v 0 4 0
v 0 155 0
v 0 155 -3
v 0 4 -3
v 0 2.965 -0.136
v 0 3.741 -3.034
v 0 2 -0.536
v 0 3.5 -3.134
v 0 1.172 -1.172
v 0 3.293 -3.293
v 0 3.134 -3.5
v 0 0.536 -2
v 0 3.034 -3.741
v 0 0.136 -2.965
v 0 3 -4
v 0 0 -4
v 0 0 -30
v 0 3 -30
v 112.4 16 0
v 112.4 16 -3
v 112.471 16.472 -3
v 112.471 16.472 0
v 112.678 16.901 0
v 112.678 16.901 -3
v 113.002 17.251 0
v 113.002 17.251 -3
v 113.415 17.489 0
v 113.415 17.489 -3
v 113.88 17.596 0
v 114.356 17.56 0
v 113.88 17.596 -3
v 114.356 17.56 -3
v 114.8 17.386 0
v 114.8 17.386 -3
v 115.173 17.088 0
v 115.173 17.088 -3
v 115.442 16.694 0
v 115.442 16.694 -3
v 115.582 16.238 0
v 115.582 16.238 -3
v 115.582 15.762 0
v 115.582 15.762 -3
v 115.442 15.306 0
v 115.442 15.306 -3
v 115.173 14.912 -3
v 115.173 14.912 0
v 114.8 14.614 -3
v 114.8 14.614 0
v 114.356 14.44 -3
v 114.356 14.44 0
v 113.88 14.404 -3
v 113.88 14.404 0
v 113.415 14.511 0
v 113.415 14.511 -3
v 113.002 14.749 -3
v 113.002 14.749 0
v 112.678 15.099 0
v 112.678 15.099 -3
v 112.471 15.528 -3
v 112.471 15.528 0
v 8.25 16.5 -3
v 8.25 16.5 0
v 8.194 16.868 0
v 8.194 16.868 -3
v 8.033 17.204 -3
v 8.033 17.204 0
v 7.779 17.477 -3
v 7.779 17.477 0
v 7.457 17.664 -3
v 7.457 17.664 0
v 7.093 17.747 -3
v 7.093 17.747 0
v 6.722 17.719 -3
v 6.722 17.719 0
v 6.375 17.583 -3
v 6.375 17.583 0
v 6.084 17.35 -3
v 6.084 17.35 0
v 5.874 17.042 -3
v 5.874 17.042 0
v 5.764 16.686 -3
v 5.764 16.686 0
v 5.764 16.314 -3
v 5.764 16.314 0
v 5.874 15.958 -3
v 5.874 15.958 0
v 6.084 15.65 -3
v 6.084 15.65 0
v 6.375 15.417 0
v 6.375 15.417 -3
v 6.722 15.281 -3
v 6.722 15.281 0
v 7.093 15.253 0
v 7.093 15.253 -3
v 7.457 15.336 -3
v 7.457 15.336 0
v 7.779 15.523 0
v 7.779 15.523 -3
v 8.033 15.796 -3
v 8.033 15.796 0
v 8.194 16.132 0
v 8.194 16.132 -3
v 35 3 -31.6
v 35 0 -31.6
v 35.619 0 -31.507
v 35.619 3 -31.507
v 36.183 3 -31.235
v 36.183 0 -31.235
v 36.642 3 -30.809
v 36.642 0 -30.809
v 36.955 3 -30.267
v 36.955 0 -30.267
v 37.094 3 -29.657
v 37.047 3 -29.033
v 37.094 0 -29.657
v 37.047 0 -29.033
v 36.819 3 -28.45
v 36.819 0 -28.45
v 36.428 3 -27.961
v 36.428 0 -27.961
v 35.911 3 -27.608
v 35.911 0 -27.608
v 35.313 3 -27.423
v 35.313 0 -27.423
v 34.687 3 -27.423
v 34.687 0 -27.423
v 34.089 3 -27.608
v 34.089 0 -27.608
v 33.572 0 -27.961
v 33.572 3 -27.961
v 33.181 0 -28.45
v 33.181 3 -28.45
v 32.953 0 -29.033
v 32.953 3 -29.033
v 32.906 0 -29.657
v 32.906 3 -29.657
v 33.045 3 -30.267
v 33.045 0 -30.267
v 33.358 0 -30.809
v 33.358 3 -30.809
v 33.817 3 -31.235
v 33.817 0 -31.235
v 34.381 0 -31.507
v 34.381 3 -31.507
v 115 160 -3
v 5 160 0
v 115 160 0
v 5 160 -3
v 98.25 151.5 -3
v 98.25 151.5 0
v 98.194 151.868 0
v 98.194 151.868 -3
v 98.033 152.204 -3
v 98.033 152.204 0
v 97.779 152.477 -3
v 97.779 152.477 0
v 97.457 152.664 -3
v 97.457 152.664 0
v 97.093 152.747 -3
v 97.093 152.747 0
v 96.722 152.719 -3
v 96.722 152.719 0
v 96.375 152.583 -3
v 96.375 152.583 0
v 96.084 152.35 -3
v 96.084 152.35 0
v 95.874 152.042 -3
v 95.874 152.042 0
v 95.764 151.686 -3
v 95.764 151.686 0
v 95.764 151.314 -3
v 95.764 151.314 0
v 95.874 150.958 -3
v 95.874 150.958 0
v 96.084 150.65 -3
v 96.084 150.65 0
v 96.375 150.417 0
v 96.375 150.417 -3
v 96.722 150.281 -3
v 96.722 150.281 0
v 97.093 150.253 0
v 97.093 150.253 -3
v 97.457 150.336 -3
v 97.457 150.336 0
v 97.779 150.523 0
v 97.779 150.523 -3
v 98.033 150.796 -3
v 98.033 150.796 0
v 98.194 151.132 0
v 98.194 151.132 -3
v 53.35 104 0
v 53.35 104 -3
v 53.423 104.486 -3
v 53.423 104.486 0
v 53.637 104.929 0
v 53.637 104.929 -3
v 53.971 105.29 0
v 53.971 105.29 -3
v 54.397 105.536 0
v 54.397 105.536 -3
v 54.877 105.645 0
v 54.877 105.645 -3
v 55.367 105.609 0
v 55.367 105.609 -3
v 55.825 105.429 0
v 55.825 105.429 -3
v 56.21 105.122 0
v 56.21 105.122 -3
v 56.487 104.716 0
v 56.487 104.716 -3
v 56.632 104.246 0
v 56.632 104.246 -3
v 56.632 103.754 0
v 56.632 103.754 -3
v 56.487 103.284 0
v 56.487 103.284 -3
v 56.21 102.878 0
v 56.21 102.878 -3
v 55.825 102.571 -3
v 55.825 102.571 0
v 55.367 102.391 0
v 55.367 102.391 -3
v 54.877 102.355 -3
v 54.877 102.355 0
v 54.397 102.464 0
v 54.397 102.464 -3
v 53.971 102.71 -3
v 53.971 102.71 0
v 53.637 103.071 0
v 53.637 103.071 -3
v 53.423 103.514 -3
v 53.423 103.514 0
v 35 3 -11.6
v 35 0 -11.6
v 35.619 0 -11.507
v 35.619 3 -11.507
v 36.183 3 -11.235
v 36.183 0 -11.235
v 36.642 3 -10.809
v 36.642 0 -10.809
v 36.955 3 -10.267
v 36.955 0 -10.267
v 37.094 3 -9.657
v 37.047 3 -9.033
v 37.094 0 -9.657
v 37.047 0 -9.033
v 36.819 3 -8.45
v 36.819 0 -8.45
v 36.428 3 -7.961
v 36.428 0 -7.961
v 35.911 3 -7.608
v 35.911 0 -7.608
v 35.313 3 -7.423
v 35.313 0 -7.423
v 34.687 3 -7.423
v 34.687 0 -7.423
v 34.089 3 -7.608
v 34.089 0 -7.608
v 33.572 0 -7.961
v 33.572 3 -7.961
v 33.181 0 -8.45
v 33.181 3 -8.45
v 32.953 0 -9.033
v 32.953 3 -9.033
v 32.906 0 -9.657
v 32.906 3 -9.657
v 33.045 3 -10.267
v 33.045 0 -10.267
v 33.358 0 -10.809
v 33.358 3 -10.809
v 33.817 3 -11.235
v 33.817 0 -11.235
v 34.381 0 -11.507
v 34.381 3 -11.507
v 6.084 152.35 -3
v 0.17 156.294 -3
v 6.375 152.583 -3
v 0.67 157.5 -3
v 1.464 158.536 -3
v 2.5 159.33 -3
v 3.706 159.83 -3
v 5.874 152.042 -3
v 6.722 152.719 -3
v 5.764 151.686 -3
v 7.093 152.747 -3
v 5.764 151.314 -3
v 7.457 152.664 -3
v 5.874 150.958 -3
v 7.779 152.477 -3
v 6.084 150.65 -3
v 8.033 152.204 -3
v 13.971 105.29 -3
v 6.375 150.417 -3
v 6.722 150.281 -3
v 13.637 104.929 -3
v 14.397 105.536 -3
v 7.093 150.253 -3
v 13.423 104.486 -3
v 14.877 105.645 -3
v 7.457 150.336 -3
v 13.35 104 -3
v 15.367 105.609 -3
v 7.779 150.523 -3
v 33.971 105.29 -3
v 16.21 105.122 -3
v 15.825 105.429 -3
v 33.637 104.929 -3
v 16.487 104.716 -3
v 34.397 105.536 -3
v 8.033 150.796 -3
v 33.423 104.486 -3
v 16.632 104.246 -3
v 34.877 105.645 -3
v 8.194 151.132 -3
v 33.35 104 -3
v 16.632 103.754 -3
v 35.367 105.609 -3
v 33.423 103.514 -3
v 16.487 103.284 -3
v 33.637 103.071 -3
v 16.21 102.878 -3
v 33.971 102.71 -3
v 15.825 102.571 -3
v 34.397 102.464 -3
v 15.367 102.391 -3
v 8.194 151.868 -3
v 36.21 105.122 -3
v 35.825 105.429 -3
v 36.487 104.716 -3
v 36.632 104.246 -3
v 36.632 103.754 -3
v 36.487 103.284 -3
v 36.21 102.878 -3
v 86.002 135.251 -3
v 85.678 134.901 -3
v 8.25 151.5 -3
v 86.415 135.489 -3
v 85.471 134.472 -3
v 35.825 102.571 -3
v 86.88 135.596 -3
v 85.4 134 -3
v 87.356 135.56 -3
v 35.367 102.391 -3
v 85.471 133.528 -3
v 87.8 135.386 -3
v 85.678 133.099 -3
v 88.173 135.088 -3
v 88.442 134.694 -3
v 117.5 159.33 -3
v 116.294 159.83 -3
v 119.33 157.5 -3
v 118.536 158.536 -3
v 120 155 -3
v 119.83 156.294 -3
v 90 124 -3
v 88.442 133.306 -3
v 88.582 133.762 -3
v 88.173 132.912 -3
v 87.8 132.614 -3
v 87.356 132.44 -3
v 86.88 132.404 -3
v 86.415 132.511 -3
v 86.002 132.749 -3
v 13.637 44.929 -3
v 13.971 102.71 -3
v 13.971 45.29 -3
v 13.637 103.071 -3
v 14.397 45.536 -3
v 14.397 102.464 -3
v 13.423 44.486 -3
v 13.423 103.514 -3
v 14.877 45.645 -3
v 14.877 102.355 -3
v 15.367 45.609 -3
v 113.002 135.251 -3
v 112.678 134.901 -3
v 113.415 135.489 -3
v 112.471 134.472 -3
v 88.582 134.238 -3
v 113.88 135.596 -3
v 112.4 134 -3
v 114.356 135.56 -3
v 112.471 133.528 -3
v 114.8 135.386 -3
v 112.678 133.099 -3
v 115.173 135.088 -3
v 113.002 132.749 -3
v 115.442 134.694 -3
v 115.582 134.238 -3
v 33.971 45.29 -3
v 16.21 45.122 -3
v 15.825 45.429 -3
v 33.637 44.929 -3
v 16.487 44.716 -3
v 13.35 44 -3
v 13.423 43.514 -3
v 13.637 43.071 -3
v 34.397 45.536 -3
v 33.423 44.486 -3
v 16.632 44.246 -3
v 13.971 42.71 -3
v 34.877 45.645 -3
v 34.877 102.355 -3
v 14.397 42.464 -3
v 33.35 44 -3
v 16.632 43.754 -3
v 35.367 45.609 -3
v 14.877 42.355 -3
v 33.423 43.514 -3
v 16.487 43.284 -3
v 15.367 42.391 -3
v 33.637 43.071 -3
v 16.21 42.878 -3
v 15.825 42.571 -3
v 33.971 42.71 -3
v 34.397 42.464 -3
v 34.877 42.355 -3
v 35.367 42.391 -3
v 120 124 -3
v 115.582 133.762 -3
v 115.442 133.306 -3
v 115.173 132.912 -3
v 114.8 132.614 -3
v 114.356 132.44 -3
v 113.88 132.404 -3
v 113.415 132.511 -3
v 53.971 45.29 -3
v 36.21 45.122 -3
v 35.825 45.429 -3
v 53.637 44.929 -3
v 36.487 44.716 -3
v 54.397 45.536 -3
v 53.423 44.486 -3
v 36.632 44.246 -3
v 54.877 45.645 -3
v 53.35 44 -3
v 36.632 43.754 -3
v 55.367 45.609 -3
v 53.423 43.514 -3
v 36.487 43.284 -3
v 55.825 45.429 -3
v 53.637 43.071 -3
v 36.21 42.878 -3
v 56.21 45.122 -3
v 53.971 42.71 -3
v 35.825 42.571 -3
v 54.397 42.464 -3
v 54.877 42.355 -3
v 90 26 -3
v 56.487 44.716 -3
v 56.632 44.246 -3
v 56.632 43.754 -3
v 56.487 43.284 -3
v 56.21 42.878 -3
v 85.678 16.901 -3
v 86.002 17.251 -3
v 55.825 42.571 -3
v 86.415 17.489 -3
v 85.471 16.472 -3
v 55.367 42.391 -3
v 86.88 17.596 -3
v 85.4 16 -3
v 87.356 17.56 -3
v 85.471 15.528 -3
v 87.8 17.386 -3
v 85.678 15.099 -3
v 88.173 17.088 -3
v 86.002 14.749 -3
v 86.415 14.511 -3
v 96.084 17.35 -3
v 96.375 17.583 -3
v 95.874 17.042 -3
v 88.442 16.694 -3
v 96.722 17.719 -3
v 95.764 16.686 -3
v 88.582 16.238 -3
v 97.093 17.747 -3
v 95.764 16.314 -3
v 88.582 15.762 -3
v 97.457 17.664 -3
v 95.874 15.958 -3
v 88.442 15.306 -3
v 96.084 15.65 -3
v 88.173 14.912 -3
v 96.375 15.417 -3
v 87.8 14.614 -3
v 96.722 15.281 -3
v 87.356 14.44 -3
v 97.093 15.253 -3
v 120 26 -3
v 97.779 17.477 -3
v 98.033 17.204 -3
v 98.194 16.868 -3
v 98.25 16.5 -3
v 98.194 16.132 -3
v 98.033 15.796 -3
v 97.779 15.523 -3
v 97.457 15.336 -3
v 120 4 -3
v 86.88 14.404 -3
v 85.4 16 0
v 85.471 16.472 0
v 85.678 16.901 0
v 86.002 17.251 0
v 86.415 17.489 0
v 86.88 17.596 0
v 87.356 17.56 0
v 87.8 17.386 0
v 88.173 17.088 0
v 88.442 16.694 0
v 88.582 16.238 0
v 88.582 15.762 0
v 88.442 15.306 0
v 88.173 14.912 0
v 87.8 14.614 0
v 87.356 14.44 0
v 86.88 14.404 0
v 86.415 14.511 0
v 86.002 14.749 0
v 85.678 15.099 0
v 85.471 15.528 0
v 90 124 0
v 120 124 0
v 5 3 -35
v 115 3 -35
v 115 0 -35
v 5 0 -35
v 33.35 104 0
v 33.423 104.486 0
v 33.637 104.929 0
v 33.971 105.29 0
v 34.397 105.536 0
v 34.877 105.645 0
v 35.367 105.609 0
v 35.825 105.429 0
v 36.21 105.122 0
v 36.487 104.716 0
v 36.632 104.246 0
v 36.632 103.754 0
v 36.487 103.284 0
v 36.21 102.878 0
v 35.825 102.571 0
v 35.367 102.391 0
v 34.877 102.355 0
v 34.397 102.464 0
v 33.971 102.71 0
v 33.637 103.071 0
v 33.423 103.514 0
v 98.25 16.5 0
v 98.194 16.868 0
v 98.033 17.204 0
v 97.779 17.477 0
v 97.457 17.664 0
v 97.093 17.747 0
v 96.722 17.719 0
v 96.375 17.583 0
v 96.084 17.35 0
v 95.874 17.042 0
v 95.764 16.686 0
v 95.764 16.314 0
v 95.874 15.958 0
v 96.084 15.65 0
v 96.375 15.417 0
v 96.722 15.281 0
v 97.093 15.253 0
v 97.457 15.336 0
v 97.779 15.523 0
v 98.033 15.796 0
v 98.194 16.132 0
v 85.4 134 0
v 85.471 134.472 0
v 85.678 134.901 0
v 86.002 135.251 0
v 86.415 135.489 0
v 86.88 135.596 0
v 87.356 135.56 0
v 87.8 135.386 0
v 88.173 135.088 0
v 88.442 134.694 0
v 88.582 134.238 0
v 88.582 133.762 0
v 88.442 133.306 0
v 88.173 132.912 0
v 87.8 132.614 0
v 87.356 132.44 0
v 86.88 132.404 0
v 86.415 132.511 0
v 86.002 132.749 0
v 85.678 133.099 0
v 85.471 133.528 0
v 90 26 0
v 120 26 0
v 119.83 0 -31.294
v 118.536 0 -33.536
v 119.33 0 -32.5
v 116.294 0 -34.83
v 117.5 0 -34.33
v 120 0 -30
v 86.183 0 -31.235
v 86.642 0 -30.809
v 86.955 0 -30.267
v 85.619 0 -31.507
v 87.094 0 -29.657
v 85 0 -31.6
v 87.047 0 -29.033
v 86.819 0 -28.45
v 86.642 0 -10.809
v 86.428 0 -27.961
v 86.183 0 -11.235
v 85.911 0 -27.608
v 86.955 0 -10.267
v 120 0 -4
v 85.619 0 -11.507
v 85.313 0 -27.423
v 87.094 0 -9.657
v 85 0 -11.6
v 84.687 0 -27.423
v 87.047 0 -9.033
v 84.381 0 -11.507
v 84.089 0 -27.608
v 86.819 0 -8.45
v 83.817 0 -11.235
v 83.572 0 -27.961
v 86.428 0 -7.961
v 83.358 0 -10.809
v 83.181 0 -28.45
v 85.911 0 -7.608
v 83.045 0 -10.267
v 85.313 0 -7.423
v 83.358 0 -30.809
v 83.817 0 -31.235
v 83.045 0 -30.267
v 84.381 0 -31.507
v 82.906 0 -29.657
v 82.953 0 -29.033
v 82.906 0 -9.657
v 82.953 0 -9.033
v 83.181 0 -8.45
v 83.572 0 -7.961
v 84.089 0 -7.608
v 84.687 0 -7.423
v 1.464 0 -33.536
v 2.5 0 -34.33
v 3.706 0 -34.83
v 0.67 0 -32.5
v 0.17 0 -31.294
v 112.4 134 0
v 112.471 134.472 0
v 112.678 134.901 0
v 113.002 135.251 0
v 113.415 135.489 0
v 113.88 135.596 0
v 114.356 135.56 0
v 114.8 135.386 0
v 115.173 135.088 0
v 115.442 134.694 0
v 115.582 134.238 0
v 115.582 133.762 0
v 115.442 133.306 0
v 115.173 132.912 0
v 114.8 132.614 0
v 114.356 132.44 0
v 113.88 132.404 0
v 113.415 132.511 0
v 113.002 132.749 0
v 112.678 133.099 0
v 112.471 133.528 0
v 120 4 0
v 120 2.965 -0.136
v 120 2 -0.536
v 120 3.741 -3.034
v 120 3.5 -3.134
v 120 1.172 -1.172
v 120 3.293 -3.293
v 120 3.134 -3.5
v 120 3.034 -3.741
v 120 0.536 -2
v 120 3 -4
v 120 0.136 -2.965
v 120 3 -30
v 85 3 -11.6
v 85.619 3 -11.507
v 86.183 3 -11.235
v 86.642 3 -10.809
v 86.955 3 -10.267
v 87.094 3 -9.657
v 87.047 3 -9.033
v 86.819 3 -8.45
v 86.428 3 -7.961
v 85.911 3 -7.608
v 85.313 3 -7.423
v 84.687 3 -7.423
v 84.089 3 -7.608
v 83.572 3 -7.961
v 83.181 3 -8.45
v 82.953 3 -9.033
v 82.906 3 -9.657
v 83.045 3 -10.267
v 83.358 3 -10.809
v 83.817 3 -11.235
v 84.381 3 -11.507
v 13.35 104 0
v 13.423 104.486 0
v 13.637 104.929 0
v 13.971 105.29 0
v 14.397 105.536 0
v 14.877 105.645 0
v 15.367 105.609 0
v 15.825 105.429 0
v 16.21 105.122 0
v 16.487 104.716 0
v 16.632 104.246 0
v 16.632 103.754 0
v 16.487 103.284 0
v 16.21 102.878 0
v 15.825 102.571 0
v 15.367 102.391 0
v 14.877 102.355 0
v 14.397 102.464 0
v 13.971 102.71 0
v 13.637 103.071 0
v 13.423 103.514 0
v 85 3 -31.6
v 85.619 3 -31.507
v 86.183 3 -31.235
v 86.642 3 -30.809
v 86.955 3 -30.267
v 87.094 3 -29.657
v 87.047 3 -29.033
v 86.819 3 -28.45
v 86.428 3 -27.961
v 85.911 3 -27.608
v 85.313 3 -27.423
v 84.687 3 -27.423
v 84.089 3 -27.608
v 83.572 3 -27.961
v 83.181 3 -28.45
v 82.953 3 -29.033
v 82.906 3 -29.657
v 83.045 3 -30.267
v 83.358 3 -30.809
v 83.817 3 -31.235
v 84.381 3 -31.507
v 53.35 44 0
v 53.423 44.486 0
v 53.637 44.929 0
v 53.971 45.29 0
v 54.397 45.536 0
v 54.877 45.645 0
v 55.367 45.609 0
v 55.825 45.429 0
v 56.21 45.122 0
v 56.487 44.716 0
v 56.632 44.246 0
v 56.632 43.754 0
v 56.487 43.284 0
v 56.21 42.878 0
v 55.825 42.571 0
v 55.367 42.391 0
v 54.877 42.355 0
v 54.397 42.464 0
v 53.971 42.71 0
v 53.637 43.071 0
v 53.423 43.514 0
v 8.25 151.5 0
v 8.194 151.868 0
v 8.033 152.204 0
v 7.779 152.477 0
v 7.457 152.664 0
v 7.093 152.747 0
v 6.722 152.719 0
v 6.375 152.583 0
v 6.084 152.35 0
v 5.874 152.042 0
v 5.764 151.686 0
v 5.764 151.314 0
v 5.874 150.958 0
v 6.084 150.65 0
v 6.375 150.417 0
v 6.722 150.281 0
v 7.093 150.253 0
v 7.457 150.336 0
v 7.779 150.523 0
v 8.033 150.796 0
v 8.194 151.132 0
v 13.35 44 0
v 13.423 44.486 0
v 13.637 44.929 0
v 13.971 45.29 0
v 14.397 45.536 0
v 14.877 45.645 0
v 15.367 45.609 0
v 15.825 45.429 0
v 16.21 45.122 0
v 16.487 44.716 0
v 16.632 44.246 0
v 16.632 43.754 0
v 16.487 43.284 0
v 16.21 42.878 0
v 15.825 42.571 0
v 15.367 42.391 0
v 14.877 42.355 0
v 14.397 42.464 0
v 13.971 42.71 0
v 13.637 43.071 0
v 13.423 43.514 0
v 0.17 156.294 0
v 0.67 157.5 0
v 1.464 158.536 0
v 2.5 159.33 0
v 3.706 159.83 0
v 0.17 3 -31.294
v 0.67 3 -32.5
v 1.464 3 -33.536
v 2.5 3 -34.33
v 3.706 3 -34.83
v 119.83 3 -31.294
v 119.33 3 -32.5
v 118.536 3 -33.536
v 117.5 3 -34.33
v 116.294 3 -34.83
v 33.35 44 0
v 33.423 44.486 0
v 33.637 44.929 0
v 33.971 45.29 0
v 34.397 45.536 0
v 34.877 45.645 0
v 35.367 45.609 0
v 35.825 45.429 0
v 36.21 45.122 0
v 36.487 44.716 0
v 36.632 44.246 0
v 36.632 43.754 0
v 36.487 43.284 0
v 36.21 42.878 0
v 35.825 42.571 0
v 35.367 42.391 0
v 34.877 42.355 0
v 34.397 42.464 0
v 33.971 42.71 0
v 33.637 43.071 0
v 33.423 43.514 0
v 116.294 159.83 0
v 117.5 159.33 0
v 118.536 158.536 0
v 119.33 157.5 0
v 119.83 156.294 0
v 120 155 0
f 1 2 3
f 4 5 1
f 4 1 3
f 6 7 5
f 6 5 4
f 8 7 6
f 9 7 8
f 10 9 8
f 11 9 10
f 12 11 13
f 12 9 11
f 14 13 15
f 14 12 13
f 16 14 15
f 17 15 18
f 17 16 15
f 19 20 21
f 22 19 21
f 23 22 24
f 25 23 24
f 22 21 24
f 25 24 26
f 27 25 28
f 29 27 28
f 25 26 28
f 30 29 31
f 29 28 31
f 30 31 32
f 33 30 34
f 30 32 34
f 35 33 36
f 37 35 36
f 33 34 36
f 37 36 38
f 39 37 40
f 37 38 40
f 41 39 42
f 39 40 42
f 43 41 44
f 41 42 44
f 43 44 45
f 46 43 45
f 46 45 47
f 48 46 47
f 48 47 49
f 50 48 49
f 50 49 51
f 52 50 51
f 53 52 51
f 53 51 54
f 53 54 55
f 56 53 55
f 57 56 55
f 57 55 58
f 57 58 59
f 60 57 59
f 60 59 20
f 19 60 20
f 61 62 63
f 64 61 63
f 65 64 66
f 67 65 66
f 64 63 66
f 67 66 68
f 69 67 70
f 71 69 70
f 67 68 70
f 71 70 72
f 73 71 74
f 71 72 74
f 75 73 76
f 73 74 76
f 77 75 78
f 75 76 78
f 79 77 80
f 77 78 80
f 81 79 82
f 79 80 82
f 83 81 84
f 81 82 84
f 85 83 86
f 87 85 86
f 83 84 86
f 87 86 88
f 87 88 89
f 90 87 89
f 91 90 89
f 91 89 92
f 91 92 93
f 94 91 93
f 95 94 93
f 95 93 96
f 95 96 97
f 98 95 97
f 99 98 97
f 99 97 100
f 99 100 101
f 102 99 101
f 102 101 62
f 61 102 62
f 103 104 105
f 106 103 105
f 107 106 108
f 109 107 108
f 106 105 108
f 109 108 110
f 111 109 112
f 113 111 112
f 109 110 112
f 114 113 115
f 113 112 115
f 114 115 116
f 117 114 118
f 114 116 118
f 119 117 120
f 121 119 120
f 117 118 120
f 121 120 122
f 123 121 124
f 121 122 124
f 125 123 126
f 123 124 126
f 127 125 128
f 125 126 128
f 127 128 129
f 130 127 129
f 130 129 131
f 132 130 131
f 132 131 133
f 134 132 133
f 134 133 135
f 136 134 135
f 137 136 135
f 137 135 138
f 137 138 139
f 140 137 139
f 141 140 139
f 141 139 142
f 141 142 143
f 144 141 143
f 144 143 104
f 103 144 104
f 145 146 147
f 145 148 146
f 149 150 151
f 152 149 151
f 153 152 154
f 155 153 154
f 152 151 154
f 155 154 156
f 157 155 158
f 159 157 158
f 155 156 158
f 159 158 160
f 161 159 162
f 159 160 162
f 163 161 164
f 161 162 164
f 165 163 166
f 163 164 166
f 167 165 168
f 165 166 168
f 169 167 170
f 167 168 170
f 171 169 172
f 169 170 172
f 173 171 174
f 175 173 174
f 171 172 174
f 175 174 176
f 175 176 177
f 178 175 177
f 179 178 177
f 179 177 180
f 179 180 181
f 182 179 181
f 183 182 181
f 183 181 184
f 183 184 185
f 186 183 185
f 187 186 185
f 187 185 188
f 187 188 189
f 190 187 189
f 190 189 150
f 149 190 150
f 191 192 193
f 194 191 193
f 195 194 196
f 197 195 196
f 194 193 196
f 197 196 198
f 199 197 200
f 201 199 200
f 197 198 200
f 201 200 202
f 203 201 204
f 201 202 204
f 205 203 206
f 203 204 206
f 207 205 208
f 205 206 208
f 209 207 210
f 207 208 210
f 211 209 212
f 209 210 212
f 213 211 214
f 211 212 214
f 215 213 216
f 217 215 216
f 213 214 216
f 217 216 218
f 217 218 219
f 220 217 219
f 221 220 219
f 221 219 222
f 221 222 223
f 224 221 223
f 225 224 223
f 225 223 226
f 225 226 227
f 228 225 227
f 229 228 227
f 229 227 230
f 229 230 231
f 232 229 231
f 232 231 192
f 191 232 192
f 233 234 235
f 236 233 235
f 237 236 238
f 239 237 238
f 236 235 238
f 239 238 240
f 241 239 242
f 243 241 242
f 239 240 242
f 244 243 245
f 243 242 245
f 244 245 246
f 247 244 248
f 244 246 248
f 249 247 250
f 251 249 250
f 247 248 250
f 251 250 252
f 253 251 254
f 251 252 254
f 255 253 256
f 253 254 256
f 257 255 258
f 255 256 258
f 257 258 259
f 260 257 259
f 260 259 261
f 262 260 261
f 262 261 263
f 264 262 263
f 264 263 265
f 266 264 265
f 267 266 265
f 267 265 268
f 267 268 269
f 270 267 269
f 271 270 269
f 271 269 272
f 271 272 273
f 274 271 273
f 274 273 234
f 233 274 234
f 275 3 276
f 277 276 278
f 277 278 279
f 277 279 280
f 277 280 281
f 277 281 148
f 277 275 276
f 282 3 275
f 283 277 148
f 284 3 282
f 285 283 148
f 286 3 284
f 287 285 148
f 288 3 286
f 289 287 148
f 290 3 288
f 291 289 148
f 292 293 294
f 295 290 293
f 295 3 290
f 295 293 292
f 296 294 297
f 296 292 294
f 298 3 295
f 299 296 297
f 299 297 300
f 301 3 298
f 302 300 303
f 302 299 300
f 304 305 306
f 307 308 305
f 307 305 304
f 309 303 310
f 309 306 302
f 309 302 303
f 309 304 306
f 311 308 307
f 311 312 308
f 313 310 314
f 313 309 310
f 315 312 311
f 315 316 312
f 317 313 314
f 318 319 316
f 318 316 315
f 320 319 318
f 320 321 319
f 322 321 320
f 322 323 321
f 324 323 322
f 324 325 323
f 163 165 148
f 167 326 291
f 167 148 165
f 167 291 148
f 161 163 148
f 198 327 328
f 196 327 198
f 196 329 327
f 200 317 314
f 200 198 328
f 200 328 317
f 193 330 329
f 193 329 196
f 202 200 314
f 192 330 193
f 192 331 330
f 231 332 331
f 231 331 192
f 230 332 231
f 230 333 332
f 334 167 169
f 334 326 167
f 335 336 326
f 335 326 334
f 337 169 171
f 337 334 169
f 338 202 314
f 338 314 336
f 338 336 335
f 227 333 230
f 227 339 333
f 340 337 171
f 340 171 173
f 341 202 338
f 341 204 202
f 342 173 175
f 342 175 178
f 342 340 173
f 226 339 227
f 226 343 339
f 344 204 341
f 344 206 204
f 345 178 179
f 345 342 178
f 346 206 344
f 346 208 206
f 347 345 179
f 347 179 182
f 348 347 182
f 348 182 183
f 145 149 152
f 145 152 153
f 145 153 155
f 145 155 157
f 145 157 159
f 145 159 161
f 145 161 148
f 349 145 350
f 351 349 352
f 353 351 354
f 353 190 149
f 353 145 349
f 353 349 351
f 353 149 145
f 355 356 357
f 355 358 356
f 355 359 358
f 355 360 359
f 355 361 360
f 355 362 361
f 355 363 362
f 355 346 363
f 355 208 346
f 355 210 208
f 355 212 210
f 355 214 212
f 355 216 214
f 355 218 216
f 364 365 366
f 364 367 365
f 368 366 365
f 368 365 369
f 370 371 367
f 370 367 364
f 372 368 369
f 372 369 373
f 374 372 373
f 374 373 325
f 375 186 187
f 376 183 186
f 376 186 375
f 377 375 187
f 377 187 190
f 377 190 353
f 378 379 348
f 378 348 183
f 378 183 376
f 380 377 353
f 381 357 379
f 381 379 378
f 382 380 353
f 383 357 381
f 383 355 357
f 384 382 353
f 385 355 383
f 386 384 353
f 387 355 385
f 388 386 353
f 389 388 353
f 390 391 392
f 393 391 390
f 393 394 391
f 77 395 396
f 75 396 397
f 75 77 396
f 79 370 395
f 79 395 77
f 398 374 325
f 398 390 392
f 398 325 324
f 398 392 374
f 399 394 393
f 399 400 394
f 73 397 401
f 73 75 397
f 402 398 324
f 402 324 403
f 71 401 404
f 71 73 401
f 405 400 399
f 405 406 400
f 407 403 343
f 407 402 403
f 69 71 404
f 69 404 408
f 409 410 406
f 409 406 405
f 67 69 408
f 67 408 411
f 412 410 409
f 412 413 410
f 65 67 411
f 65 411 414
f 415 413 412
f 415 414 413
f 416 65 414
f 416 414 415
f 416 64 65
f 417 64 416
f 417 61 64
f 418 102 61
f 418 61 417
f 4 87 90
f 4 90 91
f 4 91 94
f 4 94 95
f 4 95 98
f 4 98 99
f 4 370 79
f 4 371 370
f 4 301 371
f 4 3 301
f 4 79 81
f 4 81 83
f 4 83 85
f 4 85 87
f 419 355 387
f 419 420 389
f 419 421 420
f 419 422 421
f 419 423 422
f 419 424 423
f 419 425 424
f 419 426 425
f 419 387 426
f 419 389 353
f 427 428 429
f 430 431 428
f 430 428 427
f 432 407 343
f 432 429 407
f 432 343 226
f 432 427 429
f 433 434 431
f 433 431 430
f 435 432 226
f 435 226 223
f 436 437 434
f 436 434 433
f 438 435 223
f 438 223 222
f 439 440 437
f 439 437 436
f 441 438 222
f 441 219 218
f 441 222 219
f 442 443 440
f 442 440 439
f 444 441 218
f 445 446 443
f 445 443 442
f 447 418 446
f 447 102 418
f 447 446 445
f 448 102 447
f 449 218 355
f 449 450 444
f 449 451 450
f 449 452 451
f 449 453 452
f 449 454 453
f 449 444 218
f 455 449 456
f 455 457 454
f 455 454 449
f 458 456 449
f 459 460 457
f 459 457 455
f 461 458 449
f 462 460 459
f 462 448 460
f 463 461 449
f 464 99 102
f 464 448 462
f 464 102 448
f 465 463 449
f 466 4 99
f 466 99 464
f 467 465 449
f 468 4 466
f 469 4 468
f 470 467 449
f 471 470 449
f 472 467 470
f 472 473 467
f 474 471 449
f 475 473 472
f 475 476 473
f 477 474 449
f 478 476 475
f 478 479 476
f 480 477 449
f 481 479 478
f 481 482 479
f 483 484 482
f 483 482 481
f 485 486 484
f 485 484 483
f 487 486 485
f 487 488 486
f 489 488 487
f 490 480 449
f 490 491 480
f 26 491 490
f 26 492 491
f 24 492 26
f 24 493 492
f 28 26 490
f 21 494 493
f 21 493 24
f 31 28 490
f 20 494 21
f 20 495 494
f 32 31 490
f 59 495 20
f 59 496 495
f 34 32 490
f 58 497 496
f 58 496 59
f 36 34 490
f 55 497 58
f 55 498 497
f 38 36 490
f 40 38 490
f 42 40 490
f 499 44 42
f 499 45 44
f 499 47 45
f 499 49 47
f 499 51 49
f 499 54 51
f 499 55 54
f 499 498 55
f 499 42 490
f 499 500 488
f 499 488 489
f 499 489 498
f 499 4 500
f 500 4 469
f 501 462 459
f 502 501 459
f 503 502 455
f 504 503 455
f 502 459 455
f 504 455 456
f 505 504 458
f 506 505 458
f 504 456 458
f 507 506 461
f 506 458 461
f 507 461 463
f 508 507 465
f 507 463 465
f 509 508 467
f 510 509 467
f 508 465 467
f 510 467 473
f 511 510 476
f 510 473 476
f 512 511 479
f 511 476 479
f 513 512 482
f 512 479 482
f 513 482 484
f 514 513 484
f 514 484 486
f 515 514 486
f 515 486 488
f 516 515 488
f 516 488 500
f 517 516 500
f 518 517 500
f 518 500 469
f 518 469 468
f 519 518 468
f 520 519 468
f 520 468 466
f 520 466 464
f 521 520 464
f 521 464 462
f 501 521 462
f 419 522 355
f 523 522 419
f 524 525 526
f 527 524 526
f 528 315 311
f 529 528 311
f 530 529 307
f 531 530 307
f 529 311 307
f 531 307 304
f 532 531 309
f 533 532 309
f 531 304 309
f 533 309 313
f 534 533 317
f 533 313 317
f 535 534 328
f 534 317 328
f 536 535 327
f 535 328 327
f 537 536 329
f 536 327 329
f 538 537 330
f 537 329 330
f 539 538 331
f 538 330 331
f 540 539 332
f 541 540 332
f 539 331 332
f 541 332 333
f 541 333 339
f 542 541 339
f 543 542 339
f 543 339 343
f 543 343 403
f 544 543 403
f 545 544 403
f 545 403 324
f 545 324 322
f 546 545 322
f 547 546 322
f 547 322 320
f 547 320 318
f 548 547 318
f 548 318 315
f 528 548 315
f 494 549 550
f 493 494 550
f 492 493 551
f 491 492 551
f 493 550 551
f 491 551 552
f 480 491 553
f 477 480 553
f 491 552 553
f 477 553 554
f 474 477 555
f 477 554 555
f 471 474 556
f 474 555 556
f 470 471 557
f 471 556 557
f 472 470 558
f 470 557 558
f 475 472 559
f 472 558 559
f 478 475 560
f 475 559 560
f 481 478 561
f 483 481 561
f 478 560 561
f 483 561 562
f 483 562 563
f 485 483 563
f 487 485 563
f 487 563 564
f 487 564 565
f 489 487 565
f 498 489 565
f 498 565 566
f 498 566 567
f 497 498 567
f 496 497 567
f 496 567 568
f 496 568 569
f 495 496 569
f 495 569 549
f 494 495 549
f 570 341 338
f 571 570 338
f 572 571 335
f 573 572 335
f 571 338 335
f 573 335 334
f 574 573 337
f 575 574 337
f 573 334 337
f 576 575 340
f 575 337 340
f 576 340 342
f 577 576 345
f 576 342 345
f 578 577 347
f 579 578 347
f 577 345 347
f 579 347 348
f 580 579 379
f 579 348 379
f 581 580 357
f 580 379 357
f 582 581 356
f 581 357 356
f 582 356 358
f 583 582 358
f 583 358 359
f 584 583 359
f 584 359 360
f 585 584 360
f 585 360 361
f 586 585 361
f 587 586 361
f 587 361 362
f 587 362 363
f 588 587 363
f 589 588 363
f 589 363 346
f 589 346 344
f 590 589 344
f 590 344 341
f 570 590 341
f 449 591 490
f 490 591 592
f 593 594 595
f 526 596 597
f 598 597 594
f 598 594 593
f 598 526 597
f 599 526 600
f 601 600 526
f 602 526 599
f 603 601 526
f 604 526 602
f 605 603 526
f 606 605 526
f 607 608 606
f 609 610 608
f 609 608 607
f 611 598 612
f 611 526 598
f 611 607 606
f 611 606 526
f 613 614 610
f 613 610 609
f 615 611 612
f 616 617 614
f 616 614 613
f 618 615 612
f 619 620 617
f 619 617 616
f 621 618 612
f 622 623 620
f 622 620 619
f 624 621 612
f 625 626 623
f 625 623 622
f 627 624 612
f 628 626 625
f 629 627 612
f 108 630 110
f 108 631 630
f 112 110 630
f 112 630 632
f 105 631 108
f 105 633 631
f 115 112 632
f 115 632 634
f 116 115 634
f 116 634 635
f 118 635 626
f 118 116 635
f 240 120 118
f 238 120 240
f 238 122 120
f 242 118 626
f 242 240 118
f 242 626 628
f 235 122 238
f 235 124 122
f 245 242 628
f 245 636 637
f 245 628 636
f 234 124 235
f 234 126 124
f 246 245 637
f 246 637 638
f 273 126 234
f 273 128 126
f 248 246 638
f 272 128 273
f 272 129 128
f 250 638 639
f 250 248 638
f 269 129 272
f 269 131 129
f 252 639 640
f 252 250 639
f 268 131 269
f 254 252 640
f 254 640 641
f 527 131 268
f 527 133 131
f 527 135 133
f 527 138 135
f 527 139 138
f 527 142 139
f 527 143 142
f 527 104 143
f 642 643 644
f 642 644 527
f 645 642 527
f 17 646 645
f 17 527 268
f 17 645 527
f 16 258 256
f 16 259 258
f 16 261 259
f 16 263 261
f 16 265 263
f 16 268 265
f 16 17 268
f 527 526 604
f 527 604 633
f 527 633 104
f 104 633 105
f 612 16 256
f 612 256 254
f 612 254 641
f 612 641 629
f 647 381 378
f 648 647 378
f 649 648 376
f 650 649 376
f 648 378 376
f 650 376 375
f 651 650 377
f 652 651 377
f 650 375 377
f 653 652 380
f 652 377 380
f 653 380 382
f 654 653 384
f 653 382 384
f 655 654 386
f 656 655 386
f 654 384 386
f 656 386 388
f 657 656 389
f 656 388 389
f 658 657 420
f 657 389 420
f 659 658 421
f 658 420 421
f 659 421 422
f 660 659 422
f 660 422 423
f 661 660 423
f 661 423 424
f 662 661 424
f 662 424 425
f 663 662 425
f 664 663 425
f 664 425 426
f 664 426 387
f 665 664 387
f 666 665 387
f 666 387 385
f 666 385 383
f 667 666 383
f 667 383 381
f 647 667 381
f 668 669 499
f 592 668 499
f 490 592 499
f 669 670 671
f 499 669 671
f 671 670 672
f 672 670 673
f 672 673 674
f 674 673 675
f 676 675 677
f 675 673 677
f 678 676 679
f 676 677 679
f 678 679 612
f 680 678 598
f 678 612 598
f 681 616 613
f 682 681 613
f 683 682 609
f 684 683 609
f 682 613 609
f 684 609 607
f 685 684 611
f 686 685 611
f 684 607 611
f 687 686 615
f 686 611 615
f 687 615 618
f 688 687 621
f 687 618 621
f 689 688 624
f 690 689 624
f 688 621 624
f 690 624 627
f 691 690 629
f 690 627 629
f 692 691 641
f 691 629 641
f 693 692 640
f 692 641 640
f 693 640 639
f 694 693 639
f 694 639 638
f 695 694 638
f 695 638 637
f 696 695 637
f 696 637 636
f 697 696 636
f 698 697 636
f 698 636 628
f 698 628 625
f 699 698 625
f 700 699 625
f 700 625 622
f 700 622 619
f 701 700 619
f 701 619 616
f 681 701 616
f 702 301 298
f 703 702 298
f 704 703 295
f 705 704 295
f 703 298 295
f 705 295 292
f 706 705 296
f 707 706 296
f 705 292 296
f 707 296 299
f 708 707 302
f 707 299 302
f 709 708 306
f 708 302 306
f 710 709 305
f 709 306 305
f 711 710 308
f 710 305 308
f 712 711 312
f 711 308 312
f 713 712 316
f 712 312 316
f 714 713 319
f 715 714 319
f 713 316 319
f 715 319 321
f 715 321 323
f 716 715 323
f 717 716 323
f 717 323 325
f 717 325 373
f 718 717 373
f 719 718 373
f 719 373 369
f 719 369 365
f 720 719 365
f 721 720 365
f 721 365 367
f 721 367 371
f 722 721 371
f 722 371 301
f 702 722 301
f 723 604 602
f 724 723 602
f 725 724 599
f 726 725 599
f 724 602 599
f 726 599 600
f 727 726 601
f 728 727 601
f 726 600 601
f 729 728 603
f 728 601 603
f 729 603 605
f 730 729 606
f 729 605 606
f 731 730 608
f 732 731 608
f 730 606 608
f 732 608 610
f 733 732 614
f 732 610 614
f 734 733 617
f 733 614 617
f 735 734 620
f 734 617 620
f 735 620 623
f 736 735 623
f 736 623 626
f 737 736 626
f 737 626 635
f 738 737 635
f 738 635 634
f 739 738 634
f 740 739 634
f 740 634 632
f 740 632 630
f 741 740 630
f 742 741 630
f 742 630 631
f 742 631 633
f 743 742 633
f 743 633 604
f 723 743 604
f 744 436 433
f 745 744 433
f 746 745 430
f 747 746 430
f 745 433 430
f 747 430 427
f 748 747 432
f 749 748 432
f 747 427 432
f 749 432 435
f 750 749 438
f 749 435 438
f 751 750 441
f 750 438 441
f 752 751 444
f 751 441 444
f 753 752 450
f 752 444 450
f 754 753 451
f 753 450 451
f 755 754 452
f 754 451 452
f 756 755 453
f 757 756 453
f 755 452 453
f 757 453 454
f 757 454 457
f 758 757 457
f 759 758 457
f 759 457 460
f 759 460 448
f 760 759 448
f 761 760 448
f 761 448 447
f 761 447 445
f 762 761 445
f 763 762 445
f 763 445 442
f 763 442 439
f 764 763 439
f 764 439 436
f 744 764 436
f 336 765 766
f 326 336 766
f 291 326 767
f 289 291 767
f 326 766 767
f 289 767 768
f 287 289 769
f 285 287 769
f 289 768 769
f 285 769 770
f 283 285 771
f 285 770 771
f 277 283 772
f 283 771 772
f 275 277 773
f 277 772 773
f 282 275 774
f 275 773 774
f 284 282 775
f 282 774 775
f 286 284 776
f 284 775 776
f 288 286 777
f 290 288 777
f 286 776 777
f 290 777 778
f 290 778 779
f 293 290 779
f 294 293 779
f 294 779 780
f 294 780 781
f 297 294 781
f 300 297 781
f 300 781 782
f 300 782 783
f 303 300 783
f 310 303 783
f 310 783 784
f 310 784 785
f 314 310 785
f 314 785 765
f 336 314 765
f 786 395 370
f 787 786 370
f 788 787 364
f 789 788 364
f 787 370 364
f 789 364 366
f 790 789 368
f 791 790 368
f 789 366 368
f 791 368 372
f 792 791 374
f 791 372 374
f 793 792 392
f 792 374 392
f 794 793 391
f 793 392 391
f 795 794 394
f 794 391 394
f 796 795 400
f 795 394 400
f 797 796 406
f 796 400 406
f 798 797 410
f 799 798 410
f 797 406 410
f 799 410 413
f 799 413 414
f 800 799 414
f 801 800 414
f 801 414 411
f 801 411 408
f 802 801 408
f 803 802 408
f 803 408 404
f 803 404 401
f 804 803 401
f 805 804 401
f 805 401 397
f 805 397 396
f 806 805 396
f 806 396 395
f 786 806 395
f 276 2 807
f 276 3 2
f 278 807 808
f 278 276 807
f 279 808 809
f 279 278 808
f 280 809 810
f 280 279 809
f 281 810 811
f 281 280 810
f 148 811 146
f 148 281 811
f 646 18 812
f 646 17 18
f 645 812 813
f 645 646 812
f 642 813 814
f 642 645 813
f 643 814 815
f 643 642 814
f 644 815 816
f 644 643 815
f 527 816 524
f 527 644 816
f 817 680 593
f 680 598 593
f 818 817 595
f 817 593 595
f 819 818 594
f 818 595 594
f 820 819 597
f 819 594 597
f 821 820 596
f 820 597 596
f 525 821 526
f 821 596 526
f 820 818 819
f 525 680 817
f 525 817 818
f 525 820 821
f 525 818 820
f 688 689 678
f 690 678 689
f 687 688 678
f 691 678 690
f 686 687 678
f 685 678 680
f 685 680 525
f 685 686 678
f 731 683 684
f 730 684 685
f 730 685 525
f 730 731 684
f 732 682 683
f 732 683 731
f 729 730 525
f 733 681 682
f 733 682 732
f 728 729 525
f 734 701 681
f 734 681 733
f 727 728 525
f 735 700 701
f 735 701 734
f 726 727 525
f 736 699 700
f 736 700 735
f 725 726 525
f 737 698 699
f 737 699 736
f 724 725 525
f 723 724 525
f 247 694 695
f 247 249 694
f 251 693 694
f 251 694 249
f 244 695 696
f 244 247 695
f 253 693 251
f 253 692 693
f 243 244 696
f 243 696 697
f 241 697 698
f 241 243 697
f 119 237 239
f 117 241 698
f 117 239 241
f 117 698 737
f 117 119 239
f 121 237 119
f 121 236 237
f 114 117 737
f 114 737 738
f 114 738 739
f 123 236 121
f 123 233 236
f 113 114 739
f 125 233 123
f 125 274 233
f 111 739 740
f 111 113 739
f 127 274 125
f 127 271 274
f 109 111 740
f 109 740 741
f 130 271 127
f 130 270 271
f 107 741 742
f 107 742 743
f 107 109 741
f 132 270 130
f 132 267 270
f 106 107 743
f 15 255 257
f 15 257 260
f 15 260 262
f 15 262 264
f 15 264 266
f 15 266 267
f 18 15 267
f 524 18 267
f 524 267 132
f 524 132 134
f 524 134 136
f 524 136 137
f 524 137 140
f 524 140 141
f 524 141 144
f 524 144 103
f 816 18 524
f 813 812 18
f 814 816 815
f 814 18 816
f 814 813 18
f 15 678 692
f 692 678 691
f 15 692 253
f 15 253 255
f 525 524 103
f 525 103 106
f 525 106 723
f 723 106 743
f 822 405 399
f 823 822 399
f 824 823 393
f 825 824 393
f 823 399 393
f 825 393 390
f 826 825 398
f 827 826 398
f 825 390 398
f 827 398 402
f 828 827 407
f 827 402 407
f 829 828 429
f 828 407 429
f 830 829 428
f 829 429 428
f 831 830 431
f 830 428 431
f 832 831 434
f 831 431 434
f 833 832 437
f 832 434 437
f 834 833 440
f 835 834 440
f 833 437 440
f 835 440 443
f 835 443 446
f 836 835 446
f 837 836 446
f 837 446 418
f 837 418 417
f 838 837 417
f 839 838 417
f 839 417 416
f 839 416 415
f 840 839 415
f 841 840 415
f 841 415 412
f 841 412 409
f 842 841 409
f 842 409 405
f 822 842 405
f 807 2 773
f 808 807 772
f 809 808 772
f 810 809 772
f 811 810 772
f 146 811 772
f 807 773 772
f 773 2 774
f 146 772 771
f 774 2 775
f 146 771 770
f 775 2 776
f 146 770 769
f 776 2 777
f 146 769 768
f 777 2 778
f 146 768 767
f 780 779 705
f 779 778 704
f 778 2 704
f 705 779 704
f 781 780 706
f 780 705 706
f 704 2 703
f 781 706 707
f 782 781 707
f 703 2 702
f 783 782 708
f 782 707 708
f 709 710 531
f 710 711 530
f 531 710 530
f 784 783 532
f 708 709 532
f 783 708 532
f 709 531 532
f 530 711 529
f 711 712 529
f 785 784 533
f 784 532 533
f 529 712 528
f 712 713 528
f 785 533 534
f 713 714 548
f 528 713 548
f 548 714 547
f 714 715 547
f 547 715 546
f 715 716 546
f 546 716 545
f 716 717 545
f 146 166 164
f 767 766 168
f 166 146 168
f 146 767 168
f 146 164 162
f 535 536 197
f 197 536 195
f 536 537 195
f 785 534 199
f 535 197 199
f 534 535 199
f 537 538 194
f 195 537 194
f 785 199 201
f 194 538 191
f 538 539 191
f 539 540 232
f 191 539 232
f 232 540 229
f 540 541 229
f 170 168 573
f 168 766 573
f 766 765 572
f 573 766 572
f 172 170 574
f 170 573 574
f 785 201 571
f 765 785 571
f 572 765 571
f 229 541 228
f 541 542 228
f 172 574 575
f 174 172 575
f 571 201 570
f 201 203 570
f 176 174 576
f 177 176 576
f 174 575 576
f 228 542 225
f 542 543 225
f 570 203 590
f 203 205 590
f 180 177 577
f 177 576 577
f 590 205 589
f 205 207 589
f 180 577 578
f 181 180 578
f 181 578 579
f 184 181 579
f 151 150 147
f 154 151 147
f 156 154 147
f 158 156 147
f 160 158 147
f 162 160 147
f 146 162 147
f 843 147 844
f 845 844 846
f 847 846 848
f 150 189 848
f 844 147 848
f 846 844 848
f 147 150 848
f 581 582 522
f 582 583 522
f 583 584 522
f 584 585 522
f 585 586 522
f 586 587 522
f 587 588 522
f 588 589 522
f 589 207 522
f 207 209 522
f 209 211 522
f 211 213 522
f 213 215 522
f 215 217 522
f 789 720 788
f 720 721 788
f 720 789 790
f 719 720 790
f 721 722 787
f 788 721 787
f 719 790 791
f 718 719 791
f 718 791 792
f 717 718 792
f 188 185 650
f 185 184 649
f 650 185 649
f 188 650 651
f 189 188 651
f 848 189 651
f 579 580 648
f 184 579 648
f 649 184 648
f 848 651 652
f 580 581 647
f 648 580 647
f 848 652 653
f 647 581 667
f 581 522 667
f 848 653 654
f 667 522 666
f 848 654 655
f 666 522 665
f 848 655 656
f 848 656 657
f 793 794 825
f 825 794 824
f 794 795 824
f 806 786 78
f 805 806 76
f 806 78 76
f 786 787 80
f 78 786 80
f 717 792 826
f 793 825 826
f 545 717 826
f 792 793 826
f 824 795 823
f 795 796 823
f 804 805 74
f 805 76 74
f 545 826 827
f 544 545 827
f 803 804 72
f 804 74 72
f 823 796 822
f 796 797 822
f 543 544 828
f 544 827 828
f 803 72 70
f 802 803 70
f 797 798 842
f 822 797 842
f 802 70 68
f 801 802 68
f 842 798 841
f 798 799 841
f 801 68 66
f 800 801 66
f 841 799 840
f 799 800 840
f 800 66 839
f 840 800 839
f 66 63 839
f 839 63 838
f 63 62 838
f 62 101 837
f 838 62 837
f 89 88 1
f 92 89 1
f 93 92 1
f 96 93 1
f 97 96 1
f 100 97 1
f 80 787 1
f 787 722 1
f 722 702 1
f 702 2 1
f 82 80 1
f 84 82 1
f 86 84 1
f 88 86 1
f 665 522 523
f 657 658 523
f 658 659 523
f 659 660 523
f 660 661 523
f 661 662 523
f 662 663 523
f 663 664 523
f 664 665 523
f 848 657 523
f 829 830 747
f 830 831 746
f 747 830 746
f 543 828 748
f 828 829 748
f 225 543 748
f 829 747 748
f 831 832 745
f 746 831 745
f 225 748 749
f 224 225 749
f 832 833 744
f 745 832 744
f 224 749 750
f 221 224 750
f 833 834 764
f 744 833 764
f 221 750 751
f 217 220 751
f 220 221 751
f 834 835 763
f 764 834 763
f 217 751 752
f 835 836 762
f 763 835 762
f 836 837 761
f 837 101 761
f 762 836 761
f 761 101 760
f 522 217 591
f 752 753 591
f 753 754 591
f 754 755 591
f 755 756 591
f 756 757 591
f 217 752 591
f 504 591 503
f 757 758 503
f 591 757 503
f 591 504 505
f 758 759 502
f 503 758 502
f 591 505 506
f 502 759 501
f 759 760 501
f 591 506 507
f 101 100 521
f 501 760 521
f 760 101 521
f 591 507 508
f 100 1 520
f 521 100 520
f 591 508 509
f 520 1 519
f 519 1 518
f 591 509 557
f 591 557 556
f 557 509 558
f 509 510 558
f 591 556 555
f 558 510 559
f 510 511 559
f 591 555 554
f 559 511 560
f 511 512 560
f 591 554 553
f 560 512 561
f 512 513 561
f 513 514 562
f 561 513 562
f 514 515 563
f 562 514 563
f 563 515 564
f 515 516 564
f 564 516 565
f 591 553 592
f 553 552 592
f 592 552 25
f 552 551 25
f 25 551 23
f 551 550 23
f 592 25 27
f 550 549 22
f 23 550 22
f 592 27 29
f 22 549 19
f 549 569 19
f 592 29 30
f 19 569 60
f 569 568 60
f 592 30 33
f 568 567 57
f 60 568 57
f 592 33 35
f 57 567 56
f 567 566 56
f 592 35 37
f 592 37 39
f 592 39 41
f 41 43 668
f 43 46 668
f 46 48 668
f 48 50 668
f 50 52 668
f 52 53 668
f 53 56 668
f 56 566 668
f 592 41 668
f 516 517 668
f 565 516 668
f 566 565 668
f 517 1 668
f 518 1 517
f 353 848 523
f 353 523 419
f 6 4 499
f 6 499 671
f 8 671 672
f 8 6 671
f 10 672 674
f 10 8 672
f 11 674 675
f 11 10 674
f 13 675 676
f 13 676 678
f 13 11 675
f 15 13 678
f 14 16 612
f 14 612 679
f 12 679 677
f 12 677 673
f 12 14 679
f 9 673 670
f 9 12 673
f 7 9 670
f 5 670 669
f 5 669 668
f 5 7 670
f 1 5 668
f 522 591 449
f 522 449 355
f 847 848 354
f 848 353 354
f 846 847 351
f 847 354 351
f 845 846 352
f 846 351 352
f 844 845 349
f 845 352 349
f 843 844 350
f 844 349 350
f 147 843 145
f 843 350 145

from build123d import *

# Parameters (mm, degrees)
SM_BASE_FLANGE_1_DEPTH      = 120
SKETCH_6_R                  = 1.6
CUT_EXTRUDE_1_DEPTH         = 188.147001045
PATTERN_LINEAR_1_COUNT      = 2
PATTERN_LINEAR_1_PITCH      = 118
PATTERN_LINEAR_1_COUNT_DIR2 = 5
PATTERN_LINEAR_1_PITCH_DIR2 = 27
SKETCH_7_R                  = 2.1
CUT_EXTRUDE_2_DEPTH         = 188.683243791
PATTERN_LINEAR_2_COUNT      = 2
PATTERN_LINEAR_2_PITCH      = 20
PATTERN_LINEAR_2_COUNT_DIR2 = 2
PATTERN_LINEAR_2_PITCH_DIR2 = 50
M4X0_7_TAPPED_HOLE1_D       = 3.3
PATTERN_LINEAR_4_COUNT      = 3
PATTERN_LINEAR_4_PITCH      = 20
PATTERN_LINEAR_4_COUNT_DIR2 = 4
PATTERN_LINEAR_4_PITCH_DIR2 = 20
SKETCH6_W                   = 120
SKETCH6_H                   = 3
BOSS_EXTRUDE1_DEPTH         = 20
SKETCH_11_R                 = 3.02820634
SKETCH_11_R_2               = 2.816705121
EXTRUDE_1_DEPTH             = 3
M3X0_5_1_D                  = 2.5
SKETCH_13_W                 = 30
SKETCH_13_H                 = 98
CUT_EXTRUDE_3_DEPTH         = 204.039405042
FILLET_1_R                  = 5


# Sheet-metal steps are written as plain solids
with BuildPart() as part:
    # Sketch 1 → 基材-凸緣1 (new body)
    with BuildSketch(Plane(origin=(0, 0, 0), x_dir=(0, 0, -1), z_dir=(1, 0, 0))):
        with BuildLine():
            Line((35, 0), (4, 0))
            ThreePointArc((4, 0), (1.171572875, 1.171572875), (0, 4))
            Line((0, 4), (0, 140))
            Line((0, 140), (3, 140))
            Line((3, 140), (3, 4))
            ThreePointArc((3, 4), (3.292893219, 3.292893219), (4, 3))
            Line((4, 3), (35, 3))
            Line((35, 3), (35, 0))
        make_face()
    extrude(amount=SM_BASE_FLANGE_1_DEPTH)

    # 草圖6 → 除料-伸長1 (cut, through all)
    with BuildSketch(Plane(origin=(0, 0, -3), x_dir=(-1, 0, 0), z_dir=(0, 0, -1))):
        with Locations((-6, 134)):
            Circle(SKETCH_6_R)
    cut_extrude_1 = extrude(amount=-CUT_EXTRUDE_1_DEPTH, mode=Mode.SUBTRACT)

    # 直線複製排列1: Cut-Extrude 1 2 × 5, 4 skipped
    with Locations(*[(j * PATTERN_LINEAR_1_PITCH_DIR2, -i * PATTERN_LINEAR_1_PITCH, 0) for i in range(PATTERN_LINEAR_1_COUNT) for j in range(PATTERN_LINEAR_1_COUNT_DIR2) if (i, j) not in ((0, 0), (0, 1), (0, 2), (1, 1), (1, 2))]):
        add(cut_extrude_1, mode=Mode.SUBTRACT)

    # 草圖7 → 除料-伸長2 (cut, through all)
    with BuildSketch(Plane.XZ):
        with Locations(Location((35, -9.5, 0), (0, 0, 270))):
            Circle(SKETCH_7_R)
    cut_extrude_2 = extrude(amount=-CUT_EXTRUDE_2_DEPTH, mode=Mode.SUBTRACT)

    # 直線複製排列2: Cut-Extrude 2 2 × 2
    with Locations(*[(j * PATTERN_LINEAR_2_PITCH_DIR2, 0, -i * PATTERN_LINEAR_2_PITCH) for i in range(PATTERN_LINEAR_2_COUNT) for j in range(PATTERN_LINEAR_2_COUNT_DIR2) if (i, j) != (0, 0)]):
        add(cut_extrude_2, mode=Mode.SUBTRACT)

    # M4x0.7 Tapped Hole1 (through all)
    with Locations(Plane.XY):
        with Locations((15, 104)):
            m4x0_7_tapped_hole1 = Hole(M4X0_7_TAPPED_HOLE1_D / 2)

    # 直線複製排列4: M4x0.7 Tapped Hole1 3 × 4, 6 skipped
    with Locations(*[(i * PATTERN_LINEAR_4_PITCH, -j * PATTERN_LINEAR_4_PITCH_DIR2, 0) for i in range(PATTERN_LINEAR_4_COUNT) for j in range(PATTERN_LINEAR_4_COUNT_DIR2) if (i, j) not in ((0, 0), (0, 1), (0, 2), (1, 1), (1, 2), (2, 1), (2, 2))]):
        add(m4x0_7_tapped_hole1, mode=Mode.SUBTRACT)

    # Sketch6 → Boss-Extrude1 (add)
    with BuildSketch(Plane(origin=(0, 140, 0), x_dir=(1, 0, 0), z_dir=(0, 1, 0))):
        with Locations((60, 1.5)):
            Rectangle(SKETCH6_W, SKETCH6_H)
    extrude(amount=BOSS_EXTRUDE1_DEPTH)

    # 草圖11 → 填料-伸長1 (add)
    with BuildSketch(Plane.XY):
        with Locations((6, 134)):
            Circle(SKETCH_11_R)
        with Locations((6, 16)):
            Circle(SKETCH_11_R_2)
    extrude(amount=-EXTRUDE_1_DEPTH)

    # M3x0.5 螺紋孔1 (through all)
    with Locations(Plane(origin=(97, 151.5, -3), x_dir=(-1, 0, 0), z_dir=(0, 0, -1))):
        with Locations((0, 0), (90, 0), (0, -135), (90, -135)):
            Hole(M3X0_5_1_D / 2)

    # 草圖13 → 除料-伸長3 (cut, through all)
    with BuildSketch(Plane.XY):
        with Locations((105, 75)):
            Rectangle(SKETCH_13_W, SKETCH_13_H)
    extrude(amount=-CUT_EXTRUDE_3_DEPTH, mode=Mode.SUBTRACT)

    # 圓角1
    fillet_1_edges = [part.edges().sort_by_distance(p)[0] for p in [
        (120, 1.5, -35),
        (0, 1.5, -35),
        (0, 160, -1.5),
        (120, 160, -1.5),
    ]]
    fillet(fillet_1_edges, radius=FILLET_1_R)


solid = part.part
